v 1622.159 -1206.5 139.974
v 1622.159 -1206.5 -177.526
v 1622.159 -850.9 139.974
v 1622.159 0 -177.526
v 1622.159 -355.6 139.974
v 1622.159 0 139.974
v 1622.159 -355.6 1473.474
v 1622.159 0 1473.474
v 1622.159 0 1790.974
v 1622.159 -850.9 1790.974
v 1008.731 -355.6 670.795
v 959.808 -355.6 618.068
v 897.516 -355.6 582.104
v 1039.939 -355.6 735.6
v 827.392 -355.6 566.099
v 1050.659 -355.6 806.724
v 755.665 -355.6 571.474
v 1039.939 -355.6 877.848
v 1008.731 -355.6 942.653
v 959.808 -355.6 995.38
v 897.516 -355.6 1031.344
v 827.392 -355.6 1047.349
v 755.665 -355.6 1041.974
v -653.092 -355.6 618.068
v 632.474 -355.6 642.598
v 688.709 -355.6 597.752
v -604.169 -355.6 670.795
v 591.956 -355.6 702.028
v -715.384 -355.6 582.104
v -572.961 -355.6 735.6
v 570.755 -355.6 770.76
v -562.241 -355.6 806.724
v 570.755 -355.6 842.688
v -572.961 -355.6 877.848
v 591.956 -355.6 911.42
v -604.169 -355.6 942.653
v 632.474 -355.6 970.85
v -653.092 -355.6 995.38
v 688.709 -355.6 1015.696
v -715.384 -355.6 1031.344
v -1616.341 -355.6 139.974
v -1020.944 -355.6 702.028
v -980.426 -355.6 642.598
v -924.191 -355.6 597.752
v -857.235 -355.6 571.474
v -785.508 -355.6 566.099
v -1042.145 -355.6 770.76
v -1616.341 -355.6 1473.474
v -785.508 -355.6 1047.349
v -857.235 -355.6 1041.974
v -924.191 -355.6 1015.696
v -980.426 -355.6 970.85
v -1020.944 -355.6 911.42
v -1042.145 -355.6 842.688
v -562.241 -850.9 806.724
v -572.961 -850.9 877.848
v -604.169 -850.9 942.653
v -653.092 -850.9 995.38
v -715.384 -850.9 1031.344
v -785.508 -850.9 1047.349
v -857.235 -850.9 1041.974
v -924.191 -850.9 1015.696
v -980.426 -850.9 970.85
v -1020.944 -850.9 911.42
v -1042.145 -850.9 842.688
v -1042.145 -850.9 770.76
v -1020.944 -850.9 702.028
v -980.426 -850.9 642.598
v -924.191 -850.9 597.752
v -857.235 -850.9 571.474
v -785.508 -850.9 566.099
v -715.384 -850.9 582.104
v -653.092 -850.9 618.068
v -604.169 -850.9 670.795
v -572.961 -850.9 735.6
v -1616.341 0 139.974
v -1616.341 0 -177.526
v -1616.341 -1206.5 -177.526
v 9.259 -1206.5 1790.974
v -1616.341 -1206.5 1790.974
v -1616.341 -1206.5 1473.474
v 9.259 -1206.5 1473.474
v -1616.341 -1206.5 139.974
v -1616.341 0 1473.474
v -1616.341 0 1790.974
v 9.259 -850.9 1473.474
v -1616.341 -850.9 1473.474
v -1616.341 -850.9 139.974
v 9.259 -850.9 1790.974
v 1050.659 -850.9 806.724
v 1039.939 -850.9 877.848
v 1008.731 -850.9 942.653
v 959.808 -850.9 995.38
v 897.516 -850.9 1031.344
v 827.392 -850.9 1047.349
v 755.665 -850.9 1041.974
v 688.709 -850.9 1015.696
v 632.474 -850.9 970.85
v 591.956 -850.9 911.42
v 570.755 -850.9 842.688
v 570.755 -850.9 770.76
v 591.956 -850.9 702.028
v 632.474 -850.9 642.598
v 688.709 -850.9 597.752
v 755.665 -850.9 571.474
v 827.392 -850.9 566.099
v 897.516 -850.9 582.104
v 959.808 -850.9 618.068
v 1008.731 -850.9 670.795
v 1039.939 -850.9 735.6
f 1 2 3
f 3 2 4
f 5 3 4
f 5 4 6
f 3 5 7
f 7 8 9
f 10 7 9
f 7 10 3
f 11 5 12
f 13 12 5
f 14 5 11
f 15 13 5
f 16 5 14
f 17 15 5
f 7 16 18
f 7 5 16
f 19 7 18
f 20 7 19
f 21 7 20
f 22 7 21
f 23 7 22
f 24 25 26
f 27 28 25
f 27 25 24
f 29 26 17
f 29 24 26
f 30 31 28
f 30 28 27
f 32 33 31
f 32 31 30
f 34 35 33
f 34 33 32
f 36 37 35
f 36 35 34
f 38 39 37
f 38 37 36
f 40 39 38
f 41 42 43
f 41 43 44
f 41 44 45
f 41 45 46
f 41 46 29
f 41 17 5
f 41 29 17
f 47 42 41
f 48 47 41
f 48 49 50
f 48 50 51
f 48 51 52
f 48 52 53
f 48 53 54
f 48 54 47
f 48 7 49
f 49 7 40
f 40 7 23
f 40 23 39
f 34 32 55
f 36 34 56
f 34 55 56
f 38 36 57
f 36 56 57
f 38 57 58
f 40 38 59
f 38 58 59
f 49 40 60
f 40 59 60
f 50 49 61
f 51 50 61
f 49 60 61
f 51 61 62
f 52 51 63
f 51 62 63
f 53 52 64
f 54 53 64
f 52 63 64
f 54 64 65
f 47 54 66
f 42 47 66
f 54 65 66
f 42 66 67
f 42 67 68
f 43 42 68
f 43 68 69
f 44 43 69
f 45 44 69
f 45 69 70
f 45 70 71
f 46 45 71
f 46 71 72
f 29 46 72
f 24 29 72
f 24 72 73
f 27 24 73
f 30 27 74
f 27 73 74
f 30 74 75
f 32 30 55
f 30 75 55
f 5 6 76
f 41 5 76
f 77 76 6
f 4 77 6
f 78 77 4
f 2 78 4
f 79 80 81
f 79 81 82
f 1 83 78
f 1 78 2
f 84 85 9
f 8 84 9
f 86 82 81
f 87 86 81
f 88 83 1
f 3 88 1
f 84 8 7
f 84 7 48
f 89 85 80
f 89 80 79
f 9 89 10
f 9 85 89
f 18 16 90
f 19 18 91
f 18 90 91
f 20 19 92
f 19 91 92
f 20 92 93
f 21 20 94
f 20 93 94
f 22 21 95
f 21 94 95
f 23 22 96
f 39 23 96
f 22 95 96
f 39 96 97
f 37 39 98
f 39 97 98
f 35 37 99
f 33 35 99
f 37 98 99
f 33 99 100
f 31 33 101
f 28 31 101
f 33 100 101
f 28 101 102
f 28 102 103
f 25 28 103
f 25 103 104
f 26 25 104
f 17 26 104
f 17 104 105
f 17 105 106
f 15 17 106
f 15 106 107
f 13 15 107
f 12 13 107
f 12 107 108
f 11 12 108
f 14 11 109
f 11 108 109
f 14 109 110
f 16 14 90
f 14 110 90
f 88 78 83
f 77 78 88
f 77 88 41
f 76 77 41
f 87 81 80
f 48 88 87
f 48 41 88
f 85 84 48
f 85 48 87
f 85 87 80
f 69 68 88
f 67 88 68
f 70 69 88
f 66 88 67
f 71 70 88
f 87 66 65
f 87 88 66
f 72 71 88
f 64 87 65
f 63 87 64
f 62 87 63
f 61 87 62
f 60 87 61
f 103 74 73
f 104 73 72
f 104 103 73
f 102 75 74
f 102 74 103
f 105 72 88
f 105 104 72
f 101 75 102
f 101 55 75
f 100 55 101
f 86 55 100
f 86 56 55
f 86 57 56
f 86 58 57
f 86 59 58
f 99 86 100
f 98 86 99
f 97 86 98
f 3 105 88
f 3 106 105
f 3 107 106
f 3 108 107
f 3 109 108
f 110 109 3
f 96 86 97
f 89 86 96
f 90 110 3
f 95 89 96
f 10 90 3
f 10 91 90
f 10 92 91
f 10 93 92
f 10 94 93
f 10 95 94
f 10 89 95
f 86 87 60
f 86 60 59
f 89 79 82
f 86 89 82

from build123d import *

# Parameters (mm, degrees)
F0_W     = 3238.5
F0_H     = 1968.5
F1_DEPTH = 1206.5
F3_DEPTH = 355.6
F4_W     = 3238.5
F4_H     = 1333.5
F5_DEPTH = 355.6
F6_R     = 241.3
F7_DEPTH = 495.3


with BuildPart() as f1:
    # F0 (on Front) → F1 (new body)
    with BuildSketch(Plane.XZ):
        with Locations((2.909454, 806.723997)):
            Rectangle(F0_W, F0_H)
    extrude(amount=F1_DEPTH)

    # F2 (on face) → F3 (cut)
    with BuildSketch(Plane.XZ.offset(1206.5)):
        Polygon((-1616.340546, 139.973997), (1622.159454, 139.973997), (1622.159454, 1790.973997), (9.259454, 1790.973997), (9.259454, 1473.473997), (-1616.340546, 1473.473997), align=None)
    extrude(amount=-F3_DEPTH, mode=Mode.SUBTRACT)

    # F4 (on face) → F5 (cut)
    with BuildSketch(Plane(origin=(0, 0, 0), x_dir=(-1, 0, 0), z_dir=(0, 1, 0))):
        with Locations((-2.909454, 806.723997)):
            Rectangle(F4_W, F4_H)
    extrude(amount=-F5_DEPTH, mode=Mode.SUBTRACT)

    # F6 (on face) → F7 (cut)
    with BuildSketch(Plane.XZ.offset(850.9)):
        with Locations((809.359454, 806.723997)):
            Circle(F6_R)
        with Locations((-803.540546, 806.723997)):
            Circle(F6_R)
    extrude(amount=-F7_DEPTH, mode=Mode.SUBTRACT)


solid = f1.part
